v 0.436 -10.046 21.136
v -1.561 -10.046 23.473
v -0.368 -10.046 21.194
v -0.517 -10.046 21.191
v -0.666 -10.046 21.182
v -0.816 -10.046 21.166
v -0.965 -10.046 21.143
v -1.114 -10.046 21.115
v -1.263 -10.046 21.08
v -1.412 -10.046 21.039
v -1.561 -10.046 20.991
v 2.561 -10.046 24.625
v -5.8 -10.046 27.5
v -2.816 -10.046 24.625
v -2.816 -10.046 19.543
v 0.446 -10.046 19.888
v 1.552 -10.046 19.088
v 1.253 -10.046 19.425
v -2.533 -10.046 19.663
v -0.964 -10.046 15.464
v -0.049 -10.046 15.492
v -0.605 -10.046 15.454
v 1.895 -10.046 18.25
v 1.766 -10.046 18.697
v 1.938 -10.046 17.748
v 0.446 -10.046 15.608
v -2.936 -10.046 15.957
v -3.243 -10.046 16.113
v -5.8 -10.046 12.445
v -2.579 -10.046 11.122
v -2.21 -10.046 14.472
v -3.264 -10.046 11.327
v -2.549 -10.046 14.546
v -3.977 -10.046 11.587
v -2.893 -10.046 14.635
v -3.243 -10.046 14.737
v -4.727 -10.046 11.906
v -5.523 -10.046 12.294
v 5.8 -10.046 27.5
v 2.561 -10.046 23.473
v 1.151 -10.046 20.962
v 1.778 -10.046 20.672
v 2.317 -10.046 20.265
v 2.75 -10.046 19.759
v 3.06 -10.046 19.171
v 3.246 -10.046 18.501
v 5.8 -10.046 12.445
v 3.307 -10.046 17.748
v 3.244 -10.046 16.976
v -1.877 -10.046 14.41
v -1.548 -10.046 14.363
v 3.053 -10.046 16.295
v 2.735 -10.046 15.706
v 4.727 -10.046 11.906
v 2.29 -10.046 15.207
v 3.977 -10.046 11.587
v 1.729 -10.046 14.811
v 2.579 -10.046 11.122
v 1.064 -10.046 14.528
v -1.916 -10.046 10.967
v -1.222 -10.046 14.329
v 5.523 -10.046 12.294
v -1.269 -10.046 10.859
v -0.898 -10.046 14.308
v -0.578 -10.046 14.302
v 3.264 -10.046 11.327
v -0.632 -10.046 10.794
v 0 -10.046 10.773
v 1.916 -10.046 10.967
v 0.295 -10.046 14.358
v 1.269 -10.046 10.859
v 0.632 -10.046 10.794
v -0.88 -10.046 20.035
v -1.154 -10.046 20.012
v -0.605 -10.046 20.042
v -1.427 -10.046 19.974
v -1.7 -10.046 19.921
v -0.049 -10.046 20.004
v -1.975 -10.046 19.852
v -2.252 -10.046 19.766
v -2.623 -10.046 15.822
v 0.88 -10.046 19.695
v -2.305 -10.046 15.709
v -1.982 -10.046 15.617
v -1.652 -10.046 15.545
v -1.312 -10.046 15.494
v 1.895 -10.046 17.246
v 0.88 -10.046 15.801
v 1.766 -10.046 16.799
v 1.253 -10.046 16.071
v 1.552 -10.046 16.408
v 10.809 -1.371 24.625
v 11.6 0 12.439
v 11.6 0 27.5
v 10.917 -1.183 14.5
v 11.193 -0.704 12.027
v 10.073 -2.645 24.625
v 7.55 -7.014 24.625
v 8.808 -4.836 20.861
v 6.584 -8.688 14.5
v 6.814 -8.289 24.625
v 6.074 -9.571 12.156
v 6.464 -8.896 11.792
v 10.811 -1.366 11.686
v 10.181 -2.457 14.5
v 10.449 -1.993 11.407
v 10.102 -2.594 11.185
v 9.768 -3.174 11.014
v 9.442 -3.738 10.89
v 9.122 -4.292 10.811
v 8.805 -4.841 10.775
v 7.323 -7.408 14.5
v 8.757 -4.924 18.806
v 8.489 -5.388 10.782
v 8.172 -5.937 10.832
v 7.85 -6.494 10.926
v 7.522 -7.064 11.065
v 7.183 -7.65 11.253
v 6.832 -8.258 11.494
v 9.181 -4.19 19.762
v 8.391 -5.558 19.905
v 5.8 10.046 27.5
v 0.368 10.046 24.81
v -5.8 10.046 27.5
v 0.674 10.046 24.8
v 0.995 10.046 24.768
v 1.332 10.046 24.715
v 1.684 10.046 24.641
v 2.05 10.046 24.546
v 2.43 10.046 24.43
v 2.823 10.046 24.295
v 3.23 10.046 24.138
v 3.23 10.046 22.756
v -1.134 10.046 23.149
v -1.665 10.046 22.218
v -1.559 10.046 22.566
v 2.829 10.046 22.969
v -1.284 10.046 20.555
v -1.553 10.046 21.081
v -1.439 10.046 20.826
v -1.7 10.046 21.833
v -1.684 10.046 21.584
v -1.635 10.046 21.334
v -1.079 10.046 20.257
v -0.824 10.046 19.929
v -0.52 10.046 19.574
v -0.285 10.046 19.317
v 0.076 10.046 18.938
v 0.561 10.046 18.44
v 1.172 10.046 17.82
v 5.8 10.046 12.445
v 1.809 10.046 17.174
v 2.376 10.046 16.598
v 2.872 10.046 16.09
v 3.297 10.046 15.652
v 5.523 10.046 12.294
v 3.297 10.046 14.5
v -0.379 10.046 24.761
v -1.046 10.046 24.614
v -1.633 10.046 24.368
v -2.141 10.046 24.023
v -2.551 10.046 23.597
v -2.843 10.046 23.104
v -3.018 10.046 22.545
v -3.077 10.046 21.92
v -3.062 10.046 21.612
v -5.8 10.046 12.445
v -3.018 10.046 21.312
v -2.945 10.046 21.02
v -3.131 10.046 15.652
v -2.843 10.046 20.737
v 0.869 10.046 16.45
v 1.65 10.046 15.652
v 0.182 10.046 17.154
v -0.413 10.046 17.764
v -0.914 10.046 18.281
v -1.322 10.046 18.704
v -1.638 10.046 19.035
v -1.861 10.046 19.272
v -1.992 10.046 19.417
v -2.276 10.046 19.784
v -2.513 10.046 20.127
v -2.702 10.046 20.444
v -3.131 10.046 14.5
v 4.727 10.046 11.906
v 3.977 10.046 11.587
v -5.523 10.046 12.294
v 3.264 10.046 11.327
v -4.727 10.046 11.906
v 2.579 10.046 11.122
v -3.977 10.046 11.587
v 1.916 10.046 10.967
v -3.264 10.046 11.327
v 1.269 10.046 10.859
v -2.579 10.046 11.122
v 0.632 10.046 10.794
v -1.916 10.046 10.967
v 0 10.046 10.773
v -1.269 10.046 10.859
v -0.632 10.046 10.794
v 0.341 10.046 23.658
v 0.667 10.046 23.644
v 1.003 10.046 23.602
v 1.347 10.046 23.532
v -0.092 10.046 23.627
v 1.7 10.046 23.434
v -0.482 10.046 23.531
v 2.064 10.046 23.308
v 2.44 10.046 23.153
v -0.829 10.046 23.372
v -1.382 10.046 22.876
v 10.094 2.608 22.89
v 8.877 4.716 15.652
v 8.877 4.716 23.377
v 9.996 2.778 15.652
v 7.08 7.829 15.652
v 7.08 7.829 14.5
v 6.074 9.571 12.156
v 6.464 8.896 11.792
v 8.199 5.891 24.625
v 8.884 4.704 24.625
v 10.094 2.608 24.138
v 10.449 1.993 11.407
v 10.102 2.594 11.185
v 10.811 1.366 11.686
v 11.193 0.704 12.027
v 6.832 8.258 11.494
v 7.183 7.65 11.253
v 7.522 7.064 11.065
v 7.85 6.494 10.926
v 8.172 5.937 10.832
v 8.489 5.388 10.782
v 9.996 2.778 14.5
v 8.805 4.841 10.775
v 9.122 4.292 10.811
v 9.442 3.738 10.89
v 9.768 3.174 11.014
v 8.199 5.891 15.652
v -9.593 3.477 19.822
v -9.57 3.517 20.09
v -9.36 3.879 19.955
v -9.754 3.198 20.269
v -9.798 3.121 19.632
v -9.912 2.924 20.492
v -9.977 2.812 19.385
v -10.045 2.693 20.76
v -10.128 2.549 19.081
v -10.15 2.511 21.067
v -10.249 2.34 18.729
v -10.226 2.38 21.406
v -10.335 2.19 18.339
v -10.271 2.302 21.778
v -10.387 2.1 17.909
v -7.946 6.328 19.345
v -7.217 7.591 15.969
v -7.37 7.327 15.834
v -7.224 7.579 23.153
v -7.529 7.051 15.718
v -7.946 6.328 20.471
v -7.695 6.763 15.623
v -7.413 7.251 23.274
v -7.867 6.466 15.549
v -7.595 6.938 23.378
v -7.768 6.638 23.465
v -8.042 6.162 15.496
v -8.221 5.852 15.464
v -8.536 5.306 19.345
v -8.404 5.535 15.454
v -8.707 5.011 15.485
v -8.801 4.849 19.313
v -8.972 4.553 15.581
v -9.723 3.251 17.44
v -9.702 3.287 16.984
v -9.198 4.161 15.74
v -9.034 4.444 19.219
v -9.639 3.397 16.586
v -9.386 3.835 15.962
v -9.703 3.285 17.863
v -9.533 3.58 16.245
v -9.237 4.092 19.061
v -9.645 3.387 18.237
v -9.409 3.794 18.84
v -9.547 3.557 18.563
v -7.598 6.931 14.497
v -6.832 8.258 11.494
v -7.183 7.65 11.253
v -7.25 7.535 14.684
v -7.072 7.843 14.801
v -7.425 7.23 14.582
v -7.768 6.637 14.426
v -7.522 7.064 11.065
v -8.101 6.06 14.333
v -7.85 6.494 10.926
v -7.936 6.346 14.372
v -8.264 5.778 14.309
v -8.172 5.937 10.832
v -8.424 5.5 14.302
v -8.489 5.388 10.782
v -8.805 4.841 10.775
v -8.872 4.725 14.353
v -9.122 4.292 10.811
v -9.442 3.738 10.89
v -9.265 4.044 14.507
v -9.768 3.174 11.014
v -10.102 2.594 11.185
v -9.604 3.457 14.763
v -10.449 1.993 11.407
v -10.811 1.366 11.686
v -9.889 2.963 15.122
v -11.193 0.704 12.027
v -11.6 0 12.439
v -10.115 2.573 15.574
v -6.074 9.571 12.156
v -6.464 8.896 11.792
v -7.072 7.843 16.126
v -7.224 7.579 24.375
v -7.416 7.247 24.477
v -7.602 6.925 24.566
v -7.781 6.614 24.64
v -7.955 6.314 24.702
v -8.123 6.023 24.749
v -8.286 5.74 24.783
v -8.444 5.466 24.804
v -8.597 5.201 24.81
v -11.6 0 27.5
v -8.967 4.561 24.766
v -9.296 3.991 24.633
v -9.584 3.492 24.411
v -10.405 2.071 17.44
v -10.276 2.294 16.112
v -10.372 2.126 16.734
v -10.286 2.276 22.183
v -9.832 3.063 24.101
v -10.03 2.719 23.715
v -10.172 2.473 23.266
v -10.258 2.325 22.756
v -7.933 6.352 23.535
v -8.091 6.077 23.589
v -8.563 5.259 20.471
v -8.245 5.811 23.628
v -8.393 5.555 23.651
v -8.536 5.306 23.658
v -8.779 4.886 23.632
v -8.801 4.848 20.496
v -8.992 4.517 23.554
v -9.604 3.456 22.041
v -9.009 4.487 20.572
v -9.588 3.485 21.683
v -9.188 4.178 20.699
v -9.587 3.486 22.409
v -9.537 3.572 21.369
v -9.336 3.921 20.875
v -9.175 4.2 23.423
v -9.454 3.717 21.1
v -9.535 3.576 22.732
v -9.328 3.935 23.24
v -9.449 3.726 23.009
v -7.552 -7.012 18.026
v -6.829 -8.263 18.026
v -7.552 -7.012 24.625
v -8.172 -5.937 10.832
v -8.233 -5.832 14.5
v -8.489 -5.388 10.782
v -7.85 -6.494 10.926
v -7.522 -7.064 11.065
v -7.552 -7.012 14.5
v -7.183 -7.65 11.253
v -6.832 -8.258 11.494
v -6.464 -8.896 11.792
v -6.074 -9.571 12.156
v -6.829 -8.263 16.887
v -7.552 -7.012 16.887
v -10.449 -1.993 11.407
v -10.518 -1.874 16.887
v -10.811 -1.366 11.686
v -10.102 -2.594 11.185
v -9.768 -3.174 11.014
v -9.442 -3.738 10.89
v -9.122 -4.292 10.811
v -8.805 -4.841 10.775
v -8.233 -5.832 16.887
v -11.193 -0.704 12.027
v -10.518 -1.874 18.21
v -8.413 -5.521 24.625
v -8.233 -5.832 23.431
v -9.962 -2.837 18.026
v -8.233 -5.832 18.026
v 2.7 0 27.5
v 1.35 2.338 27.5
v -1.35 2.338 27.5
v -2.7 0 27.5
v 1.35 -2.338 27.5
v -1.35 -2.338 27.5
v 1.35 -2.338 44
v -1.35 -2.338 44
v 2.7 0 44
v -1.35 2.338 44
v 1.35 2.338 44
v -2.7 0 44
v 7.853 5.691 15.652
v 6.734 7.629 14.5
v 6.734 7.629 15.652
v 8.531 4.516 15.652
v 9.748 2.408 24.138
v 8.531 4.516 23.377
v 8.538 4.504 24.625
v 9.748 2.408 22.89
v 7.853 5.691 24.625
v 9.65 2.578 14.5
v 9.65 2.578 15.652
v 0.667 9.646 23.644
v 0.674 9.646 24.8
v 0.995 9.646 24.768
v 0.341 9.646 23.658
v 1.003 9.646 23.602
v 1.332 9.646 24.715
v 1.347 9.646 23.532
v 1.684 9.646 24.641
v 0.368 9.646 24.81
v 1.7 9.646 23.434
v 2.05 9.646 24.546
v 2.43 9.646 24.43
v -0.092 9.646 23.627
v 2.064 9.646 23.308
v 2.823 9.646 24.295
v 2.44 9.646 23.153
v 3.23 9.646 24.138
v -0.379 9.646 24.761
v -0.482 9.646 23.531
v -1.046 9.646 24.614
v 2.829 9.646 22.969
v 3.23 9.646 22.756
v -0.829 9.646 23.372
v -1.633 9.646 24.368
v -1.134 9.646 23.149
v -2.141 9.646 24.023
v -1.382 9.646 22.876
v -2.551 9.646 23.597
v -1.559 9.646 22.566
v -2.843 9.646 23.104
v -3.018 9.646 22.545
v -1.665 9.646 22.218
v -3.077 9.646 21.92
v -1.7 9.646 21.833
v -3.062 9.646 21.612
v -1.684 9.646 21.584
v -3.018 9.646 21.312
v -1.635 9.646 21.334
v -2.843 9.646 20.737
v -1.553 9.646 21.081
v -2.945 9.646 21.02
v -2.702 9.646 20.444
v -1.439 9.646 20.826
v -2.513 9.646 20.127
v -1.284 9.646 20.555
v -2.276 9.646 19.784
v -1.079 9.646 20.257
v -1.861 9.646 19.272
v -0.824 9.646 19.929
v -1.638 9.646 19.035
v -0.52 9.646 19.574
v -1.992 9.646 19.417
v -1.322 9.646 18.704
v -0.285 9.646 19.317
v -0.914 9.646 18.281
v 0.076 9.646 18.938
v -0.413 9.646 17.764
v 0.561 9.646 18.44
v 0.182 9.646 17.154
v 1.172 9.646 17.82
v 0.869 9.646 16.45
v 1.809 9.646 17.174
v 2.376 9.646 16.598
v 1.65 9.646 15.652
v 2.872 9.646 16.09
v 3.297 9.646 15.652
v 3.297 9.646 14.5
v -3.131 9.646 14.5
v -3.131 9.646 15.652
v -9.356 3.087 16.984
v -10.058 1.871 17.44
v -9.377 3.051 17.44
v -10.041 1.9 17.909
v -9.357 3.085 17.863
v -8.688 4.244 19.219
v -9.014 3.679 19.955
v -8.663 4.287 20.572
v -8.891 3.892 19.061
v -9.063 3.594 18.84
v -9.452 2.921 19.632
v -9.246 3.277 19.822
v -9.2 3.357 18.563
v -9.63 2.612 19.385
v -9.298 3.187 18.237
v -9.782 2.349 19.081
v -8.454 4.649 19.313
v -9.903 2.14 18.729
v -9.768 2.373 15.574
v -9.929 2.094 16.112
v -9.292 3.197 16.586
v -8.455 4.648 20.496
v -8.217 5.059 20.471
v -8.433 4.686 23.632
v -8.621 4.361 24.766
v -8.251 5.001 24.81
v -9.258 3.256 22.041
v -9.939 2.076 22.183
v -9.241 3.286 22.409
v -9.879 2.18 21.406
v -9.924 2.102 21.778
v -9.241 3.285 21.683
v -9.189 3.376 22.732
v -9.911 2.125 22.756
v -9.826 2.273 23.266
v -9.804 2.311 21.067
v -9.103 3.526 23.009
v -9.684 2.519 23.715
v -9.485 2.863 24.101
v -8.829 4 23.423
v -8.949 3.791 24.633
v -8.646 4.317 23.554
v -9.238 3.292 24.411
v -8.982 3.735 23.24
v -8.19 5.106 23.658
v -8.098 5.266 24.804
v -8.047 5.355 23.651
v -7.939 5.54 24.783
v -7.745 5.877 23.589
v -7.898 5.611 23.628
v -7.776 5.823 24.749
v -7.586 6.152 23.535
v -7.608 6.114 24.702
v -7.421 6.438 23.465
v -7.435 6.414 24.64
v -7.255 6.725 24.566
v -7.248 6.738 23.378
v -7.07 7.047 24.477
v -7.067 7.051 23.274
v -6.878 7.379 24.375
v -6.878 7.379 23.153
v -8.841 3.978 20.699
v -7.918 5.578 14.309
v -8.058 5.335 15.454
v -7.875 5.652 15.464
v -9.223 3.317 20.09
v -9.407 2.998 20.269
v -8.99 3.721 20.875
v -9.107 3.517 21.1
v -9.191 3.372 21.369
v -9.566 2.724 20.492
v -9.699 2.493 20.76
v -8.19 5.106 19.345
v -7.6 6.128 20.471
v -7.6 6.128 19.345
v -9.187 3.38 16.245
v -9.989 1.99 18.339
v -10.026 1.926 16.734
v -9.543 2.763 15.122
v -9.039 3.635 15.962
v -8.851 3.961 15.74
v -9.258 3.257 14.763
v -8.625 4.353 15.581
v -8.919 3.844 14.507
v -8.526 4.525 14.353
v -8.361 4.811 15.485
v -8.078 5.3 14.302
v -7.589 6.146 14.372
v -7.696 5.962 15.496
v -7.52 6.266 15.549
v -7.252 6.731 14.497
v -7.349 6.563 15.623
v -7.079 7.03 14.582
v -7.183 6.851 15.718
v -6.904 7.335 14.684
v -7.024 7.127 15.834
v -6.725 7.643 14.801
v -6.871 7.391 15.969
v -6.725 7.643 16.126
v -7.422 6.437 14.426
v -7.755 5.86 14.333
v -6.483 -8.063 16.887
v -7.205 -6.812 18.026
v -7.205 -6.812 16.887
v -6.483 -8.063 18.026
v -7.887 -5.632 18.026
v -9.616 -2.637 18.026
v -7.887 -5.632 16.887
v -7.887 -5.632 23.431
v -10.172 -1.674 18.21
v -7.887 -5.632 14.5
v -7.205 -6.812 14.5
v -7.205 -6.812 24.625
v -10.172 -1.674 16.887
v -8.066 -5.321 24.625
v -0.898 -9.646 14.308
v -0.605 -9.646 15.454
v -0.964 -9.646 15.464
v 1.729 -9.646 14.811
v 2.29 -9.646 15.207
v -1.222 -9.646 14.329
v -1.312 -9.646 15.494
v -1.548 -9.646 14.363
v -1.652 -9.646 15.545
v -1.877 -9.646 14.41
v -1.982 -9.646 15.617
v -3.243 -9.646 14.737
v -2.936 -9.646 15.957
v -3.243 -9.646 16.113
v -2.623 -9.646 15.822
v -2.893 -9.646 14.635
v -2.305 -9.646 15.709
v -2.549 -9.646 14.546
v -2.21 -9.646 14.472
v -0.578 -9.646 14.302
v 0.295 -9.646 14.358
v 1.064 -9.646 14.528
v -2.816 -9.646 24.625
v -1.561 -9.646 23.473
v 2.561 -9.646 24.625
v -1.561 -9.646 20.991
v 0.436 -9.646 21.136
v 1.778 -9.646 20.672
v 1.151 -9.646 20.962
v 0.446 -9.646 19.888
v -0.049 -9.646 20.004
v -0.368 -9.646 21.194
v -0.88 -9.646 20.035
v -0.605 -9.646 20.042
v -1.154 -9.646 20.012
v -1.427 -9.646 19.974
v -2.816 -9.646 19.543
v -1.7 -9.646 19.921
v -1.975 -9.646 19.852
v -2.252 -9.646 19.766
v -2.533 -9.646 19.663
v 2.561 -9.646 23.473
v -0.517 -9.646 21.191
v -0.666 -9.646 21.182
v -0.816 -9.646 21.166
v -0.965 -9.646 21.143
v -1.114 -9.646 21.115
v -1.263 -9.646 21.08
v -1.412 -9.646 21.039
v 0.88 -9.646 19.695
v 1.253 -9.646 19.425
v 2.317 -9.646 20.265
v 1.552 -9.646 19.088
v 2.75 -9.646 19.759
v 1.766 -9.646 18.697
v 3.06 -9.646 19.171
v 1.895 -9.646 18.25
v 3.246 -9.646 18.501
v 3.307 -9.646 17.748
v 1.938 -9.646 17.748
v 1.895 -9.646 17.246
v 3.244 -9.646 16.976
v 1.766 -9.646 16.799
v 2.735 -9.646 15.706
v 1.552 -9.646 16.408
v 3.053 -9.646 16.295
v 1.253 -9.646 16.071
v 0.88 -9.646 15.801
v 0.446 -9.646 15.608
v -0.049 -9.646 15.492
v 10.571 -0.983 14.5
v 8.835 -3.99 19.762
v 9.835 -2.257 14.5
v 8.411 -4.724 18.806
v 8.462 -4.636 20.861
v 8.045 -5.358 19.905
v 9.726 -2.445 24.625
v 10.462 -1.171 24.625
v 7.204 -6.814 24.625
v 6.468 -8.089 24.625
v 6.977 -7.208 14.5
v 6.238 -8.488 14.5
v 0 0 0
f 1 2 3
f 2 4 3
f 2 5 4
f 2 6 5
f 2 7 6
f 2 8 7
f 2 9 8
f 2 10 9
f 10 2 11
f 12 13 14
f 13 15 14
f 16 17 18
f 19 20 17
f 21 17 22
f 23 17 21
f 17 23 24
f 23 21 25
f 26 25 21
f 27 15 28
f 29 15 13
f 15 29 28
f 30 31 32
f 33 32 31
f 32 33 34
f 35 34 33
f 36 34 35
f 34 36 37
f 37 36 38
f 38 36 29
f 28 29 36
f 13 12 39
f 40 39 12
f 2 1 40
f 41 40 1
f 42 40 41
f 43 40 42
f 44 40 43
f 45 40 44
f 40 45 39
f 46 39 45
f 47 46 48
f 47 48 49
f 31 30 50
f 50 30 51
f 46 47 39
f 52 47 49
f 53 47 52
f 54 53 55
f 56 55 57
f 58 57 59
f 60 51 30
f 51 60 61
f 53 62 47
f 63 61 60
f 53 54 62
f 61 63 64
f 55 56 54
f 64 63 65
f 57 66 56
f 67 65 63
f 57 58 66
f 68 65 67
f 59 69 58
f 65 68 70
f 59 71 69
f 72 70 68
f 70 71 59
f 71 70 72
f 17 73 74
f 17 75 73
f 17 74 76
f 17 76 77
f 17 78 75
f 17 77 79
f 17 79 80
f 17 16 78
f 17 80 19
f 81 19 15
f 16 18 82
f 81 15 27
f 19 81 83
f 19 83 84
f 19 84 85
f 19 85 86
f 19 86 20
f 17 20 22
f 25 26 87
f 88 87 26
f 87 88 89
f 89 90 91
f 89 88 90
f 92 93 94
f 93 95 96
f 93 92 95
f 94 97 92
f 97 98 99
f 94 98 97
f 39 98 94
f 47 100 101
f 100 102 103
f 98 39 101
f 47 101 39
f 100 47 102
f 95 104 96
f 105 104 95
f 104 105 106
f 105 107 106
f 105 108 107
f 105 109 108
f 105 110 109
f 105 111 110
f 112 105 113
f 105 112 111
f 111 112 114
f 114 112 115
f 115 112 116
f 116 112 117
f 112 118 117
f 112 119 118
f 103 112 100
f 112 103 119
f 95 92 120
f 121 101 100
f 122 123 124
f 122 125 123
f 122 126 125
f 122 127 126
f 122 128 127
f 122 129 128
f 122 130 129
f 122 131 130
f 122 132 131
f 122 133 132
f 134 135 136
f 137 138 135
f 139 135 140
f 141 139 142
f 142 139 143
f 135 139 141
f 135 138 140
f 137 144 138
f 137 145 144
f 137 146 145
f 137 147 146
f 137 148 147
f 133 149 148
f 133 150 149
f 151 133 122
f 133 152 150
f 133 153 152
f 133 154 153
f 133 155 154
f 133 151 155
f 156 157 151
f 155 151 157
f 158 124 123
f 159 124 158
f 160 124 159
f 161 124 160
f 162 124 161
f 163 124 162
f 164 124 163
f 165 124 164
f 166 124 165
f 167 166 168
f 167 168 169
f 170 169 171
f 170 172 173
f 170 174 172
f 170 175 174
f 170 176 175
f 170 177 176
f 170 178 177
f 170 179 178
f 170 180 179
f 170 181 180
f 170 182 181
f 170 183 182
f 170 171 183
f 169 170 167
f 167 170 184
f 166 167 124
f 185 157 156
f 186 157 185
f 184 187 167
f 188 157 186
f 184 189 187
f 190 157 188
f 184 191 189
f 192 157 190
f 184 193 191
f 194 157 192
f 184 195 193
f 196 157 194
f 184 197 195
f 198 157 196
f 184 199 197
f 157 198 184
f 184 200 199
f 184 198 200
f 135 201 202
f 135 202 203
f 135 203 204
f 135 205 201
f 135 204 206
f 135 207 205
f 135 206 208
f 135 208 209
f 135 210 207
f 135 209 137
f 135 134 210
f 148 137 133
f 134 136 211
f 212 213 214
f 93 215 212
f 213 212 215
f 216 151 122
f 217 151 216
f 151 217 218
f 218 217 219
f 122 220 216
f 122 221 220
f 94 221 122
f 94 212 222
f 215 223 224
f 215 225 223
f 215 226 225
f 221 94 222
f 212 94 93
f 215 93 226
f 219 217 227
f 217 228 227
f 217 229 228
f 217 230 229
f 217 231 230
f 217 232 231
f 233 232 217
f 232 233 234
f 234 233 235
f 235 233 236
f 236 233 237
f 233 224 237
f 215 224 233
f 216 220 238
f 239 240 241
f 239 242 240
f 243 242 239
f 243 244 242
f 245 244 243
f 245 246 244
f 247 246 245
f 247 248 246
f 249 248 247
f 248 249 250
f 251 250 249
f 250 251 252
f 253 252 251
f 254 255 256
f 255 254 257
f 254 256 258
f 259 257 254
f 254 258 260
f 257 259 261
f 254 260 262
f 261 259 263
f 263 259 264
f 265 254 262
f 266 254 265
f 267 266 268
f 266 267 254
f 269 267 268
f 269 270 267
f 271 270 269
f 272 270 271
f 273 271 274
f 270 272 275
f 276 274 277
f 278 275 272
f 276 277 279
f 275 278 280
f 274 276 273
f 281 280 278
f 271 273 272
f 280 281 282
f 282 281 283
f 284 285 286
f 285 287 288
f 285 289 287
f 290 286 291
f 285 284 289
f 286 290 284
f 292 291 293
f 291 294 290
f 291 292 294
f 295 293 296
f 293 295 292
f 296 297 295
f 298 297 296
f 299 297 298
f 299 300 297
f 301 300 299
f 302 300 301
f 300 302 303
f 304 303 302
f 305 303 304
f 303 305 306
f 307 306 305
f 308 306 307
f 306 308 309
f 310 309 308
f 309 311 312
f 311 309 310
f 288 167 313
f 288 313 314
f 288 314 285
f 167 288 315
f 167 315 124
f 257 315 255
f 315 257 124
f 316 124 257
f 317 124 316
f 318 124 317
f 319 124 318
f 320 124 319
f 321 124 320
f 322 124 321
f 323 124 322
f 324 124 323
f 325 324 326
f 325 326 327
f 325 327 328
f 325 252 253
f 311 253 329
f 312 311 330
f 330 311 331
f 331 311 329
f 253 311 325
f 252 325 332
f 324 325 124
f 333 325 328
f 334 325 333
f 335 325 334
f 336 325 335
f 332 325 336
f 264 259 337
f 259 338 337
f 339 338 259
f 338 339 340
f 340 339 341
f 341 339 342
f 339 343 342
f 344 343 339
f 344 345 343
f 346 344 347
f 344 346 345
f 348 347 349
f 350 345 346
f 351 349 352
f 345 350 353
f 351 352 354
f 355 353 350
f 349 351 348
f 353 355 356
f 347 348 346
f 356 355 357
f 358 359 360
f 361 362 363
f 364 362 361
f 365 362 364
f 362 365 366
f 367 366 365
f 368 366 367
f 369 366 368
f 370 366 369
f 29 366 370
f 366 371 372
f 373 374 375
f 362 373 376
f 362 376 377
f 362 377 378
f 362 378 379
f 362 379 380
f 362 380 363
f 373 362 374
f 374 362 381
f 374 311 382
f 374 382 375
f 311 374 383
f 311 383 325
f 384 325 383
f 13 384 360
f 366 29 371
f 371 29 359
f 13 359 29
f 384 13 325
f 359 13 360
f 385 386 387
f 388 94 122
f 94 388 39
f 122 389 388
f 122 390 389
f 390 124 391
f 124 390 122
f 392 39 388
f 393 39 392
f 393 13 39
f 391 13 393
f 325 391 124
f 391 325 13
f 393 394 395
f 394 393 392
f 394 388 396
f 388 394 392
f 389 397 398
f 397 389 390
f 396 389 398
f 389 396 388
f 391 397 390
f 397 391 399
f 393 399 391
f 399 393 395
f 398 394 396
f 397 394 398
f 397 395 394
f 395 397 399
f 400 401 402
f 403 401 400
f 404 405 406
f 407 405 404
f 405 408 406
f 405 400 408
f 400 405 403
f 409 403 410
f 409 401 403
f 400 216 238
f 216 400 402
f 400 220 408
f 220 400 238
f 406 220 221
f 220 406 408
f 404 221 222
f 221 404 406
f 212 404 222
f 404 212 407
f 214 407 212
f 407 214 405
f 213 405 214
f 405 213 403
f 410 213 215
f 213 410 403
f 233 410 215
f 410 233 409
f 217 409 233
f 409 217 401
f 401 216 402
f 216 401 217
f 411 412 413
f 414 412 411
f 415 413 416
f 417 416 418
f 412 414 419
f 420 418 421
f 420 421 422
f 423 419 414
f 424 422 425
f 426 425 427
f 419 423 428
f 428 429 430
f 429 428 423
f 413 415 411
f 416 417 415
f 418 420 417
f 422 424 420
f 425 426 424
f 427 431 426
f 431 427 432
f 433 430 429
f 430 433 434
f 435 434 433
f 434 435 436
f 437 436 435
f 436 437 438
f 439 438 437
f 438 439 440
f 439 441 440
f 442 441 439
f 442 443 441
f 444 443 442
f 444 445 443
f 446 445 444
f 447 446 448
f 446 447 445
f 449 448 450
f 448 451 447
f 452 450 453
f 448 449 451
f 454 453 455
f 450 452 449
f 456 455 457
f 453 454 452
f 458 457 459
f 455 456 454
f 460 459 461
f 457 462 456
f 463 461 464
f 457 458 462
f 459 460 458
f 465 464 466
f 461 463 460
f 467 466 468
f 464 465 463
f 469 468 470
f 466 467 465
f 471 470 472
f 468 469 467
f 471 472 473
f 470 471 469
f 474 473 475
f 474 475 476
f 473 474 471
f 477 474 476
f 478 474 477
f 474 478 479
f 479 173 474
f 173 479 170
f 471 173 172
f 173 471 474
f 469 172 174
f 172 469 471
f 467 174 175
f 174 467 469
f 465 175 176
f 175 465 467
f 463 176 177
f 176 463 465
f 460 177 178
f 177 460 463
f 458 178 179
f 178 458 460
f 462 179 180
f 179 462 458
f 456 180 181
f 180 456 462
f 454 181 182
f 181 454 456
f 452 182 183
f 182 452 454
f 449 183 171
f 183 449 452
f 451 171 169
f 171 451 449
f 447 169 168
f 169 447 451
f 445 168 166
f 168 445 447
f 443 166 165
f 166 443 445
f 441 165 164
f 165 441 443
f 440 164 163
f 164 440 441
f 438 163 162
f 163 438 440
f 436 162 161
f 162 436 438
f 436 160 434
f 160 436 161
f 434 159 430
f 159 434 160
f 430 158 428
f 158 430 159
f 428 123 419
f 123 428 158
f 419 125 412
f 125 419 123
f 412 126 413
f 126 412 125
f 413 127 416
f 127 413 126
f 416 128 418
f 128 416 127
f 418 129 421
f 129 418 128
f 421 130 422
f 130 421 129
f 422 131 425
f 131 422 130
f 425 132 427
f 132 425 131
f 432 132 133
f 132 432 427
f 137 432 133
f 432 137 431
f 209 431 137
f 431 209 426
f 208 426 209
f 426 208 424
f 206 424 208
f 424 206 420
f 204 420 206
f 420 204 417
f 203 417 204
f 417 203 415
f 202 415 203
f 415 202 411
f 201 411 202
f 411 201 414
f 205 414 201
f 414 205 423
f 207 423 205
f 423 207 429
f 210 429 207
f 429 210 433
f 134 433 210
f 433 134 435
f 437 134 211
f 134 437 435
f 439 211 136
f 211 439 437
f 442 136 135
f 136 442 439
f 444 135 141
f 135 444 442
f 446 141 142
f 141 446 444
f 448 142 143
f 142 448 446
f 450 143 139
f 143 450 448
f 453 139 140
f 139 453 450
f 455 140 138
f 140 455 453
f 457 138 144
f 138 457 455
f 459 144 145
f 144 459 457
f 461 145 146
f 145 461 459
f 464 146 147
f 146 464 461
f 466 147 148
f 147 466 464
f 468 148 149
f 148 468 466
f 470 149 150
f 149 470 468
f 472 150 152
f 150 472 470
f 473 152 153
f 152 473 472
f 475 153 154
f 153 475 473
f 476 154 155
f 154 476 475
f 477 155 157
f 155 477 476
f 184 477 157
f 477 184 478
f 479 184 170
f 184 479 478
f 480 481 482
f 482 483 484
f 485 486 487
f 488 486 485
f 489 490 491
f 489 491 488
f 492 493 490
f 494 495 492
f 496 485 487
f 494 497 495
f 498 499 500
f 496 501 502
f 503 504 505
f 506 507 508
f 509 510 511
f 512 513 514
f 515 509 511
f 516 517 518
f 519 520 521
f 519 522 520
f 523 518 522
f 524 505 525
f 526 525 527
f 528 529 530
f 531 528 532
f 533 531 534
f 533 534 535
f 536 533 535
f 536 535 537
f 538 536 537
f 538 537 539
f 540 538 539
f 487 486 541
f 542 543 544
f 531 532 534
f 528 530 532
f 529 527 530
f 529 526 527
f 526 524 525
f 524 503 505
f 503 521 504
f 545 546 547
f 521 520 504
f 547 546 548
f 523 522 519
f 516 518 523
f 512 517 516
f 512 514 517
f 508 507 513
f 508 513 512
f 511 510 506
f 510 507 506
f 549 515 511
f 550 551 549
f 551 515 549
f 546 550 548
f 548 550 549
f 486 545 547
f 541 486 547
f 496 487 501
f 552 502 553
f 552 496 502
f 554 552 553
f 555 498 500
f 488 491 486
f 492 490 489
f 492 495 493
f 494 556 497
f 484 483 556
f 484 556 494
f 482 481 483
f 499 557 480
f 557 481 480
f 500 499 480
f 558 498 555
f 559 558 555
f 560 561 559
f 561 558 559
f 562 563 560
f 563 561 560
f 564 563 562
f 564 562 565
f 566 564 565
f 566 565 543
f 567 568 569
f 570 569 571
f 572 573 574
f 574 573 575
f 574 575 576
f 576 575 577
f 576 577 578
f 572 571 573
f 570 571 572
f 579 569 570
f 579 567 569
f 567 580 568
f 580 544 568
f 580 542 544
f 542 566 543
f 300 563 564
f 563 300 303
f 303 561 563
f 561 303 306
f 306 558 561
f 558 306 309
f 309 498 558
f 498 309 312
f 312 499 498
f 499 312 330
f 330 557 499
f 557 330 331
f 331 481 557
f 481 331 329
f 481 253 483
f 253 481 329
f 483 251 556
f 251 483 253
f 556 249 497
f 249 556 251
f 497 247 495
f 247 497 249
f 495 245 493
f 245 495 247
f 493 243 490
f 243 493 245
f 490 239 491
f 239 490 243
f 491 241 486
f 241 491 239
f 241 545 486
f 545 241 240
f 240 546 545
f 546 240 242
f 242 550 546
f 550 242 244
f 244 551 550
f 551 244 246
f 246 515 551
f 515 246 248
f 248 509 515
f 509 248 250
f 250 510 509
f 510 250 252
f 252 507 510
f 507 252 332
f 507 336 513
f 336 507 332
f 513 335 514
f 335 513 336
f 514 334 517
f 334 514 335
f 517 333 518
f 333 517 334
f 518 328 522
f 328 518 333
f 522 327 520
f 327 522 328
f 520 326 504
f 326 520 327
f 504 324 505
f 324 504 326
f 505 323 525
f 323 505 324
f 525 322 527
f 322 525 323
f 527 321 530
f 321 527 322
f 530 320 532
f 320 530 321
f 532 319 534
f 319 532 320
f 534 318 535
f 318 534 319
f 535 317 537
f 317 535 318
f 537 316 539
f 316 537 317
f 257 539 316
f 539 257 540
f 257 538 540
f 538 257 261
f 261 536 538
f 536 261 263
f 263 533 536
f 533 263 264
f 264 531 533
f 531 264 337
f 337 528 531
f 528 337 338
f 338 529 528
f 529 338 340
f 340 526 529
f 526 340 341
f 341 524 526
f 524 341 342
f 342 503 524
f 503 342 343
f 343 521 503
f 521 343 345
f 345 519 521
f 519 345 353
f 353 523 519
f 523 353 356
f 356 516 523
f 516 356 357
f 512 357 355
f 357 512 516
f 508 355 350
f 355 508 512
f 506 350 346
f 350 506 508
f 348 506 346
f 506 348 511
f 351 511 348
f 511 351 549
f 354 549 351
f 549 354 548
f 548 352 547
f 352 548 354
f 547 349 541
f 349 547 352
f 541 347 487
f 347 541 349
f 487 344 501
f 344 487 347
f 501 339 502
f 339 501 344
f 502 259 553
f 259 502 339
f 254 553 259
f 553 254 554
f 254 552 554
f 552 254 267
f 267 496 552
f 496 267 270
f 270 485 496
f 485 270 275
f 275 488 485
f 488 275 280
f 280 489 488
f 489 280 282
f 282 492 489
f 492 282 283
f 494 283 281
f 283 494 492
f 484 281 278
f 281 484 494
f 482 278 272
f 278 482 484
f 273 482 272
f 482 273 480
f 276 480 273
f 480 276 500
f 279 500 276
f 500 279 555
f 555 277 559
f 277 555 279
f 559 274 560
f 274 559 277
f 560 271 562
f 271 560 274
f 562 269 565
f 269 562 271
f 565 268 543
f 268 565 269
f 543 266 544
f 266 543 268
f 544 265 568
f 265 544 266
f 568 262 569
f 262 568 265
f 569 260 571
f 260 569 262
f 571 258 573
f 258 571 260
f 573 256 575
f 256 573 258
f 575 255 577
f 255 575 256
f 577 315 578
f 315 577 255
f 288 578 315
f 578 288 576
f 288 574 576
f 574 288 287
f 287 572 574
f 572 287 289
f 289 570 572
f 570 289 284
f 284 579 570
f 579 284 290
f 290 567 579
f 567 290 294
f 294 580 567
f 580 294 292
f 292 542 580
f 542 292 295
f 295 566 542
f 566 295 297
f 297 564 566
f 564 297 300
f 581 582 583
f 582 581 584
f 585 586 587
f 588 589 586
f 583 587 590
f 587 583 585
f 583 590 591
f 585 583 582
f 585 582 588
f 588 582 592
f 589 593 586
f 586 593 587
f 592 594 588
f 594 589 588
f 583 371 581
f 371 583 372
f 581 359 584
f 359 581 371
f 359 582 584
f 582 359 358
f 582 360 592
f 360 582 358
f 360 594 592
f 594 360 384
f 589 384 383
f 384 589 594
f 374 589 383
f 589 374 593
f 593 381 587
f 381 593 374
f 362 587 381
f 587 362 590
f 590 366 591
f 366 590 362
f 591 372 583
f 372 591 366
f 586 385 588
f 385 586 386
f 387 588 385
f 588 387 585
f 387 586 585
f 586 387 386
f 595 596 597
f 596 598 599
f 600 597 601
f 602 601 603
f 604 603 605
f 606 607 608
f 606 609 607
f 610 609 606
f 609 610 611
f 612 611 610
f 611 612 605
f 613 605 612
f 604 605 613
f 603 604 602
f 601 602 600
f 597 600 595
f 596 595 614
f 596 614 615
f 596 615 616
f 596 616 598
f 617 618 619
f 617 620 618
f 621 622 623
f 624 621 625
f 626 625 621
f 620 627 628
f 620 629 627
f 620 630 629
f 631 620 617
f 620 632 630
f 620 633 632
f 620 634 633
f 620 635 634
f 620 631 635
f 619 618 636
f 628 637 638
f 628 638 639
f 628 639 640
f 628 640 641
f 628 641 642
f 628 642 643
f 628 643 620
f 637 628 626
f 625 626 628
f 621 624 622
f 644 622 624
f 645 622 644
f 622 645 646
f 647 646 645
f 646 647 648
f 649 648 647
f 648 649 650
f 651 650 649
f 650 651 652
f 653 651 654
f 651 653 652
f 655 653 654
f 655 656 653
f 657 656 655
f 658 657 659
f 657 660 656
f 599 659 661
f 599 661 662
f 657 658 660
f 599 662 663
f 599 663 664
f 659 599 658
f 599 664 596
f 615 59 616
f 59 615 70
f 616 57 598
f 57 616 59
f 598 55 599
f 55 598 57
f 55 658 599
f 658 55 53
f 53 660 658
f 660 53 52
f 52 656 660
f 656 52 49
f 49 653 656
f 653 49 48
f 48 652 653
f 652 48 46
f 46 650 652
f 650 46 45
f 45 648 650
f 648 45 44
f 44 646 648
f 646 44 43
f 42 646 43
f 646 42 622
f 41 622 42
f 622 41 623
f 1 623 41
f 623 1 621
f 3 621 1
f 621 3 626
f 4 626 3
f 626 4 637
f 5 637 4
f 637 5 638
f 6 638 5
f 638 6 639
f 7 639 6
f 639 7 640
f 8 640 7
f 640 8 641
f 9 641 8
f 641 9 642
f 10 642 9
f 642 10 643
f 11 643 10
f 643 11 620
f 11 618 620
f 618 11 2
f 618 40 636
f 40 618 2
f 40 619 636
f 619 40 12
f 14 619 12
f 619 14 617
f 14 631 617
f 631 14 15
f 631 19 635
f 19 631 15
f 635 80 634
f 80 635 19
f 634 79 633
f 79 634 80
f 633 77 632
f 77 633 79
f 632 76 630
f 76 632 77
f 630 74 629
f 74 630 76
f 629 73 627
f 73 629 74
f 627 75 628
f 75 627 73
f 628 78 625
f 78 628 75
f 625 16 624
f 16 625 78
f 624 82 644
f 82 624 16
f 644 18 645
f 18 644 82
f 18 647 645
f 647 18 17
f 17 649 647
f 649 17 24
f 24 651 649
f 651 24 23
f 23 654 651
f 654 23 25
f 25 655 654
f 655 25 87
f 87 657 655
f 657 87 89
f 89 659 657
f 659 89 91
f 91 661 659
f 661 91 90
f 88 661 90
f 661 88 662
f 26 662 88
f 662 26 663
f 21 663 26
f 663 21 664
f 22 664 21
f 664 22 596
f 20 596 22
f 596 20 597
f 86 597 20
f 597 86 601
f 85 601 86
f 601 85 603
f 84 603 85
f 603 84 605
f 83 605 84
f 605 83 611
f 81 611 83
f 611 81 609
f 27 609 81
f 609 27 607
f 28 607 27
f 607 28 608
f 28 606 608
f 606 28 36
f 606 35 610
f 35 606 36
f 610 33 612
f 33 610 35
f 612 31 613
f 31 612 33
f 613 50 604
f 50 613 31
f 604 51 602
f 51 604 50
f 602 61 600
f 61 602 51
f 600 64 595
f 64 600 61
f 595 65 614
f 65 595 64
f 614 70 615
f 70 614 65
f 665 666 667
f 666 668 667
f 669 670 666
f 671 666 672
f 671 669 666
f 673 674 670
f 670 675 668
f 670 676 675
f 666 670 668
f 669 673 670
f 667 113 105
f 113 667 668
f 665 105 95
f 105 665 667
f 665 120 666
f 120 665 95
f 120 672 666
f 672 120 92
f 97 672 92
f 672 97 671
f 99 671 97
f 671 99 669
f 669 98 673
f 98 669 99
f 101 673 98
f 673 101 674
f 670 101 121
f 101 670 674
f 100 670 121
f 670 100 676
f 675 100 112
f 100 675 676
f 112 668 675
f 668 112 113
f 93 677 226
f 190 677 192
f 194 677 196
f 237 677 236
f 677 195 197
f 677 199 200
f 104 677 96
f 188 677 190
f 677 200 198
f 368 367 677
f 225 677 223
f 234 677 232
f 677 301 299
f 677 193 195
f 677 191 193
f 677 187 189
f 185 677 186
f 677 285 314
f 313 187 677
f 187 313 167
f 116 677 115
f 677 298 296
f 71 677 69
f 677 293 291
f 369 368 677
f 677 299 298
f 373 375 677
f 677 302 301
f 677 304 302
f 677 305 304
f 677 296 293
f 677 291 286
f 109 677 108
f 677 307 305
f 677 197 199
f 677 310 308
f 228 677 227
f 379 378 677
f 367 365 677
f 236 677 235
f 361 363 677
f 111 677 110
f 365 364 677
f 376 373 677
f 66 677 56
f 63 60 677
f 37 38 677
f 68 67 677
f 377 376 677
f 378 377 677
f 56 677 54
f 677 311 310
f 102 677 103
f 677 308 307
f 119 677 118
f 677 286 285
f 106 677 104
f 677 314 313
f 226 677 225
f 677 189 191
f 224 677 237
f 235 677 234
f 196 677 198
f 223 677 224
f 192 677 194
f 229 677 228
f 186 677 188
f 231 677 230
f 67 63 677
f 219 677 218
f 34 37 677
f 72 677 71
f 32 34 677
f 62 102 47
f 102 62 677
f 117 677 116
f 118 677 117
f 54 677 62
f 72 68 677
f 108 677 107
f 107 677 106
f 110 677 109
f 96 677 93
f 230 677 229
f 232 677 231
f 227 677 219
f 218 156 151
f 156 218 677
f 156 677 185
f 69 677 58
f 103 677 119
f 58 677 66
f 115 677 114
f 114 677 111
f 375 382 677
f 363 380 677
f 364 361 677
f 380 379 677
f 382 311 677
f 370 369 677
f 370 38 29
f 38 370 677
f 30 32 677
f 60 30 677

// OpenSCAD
/* Pirra, a traditional log drivers' amusement object
 * from Finland. All dimensions are in millimetres.
 *
 * Dimensions are similar to the original historical object
 * but this object is not historically accurate.
 *
 * Made by Joel Lehtonen.
 */

/* [Geometry] */
// Symbols on sides. Length determines the geometry, e.g. 6 elements generate a hexagon.
sym = ["1","2","3","4","5","X"];
// Tip angle
tip_angle=43;         
// Height of the whole object
height = 44;
// Handle height (topmost part)
handle_height = 16.5;
// Handle radius
handle_r = 2.7;
// Number part radius
pirra_r = 11.6;

/* [Text rendering] */
// Font
font = "Chilanka";
// Font size
text_size = 10;
// How deep are the letter indentations
text_indent=0.4;
// Letter base position from the tip
letter_z = 14.5;

/* [Hidden] */
sides = len(sym);
epsilon = 0.1; // To avoid overlapping triangles in rendering

intersection() {
    difference() {
        union() {
            // Pirra surface
            cylinder(height - handle_height, pirra_r, pirra_r, $fn=sides);
            // Pirra handle
            cylinder(height, handle_r, handle_r, $fn=6);
        }
        
        // Letter positioning
        letter_depth = pirra_r * cos(180/sides)-text_indent;
        for (reuna = [0:sides-1]) {
            rotate([90,0,(360/sides)*(reuna+0.5)]) {
                translate([letter_depth,letter_z,0]) {
                    rotate([0,90,0]) {
                        linear_extrude(text_indent+epsilon) {
                            text(sym[reuna], size=text_size, font=font, halign="center");
                        }
                    }
                }
            }
        }
    }
    // Tip
    cylinder(height, 0, height*tan(tip_angle), $fn=100);
}
